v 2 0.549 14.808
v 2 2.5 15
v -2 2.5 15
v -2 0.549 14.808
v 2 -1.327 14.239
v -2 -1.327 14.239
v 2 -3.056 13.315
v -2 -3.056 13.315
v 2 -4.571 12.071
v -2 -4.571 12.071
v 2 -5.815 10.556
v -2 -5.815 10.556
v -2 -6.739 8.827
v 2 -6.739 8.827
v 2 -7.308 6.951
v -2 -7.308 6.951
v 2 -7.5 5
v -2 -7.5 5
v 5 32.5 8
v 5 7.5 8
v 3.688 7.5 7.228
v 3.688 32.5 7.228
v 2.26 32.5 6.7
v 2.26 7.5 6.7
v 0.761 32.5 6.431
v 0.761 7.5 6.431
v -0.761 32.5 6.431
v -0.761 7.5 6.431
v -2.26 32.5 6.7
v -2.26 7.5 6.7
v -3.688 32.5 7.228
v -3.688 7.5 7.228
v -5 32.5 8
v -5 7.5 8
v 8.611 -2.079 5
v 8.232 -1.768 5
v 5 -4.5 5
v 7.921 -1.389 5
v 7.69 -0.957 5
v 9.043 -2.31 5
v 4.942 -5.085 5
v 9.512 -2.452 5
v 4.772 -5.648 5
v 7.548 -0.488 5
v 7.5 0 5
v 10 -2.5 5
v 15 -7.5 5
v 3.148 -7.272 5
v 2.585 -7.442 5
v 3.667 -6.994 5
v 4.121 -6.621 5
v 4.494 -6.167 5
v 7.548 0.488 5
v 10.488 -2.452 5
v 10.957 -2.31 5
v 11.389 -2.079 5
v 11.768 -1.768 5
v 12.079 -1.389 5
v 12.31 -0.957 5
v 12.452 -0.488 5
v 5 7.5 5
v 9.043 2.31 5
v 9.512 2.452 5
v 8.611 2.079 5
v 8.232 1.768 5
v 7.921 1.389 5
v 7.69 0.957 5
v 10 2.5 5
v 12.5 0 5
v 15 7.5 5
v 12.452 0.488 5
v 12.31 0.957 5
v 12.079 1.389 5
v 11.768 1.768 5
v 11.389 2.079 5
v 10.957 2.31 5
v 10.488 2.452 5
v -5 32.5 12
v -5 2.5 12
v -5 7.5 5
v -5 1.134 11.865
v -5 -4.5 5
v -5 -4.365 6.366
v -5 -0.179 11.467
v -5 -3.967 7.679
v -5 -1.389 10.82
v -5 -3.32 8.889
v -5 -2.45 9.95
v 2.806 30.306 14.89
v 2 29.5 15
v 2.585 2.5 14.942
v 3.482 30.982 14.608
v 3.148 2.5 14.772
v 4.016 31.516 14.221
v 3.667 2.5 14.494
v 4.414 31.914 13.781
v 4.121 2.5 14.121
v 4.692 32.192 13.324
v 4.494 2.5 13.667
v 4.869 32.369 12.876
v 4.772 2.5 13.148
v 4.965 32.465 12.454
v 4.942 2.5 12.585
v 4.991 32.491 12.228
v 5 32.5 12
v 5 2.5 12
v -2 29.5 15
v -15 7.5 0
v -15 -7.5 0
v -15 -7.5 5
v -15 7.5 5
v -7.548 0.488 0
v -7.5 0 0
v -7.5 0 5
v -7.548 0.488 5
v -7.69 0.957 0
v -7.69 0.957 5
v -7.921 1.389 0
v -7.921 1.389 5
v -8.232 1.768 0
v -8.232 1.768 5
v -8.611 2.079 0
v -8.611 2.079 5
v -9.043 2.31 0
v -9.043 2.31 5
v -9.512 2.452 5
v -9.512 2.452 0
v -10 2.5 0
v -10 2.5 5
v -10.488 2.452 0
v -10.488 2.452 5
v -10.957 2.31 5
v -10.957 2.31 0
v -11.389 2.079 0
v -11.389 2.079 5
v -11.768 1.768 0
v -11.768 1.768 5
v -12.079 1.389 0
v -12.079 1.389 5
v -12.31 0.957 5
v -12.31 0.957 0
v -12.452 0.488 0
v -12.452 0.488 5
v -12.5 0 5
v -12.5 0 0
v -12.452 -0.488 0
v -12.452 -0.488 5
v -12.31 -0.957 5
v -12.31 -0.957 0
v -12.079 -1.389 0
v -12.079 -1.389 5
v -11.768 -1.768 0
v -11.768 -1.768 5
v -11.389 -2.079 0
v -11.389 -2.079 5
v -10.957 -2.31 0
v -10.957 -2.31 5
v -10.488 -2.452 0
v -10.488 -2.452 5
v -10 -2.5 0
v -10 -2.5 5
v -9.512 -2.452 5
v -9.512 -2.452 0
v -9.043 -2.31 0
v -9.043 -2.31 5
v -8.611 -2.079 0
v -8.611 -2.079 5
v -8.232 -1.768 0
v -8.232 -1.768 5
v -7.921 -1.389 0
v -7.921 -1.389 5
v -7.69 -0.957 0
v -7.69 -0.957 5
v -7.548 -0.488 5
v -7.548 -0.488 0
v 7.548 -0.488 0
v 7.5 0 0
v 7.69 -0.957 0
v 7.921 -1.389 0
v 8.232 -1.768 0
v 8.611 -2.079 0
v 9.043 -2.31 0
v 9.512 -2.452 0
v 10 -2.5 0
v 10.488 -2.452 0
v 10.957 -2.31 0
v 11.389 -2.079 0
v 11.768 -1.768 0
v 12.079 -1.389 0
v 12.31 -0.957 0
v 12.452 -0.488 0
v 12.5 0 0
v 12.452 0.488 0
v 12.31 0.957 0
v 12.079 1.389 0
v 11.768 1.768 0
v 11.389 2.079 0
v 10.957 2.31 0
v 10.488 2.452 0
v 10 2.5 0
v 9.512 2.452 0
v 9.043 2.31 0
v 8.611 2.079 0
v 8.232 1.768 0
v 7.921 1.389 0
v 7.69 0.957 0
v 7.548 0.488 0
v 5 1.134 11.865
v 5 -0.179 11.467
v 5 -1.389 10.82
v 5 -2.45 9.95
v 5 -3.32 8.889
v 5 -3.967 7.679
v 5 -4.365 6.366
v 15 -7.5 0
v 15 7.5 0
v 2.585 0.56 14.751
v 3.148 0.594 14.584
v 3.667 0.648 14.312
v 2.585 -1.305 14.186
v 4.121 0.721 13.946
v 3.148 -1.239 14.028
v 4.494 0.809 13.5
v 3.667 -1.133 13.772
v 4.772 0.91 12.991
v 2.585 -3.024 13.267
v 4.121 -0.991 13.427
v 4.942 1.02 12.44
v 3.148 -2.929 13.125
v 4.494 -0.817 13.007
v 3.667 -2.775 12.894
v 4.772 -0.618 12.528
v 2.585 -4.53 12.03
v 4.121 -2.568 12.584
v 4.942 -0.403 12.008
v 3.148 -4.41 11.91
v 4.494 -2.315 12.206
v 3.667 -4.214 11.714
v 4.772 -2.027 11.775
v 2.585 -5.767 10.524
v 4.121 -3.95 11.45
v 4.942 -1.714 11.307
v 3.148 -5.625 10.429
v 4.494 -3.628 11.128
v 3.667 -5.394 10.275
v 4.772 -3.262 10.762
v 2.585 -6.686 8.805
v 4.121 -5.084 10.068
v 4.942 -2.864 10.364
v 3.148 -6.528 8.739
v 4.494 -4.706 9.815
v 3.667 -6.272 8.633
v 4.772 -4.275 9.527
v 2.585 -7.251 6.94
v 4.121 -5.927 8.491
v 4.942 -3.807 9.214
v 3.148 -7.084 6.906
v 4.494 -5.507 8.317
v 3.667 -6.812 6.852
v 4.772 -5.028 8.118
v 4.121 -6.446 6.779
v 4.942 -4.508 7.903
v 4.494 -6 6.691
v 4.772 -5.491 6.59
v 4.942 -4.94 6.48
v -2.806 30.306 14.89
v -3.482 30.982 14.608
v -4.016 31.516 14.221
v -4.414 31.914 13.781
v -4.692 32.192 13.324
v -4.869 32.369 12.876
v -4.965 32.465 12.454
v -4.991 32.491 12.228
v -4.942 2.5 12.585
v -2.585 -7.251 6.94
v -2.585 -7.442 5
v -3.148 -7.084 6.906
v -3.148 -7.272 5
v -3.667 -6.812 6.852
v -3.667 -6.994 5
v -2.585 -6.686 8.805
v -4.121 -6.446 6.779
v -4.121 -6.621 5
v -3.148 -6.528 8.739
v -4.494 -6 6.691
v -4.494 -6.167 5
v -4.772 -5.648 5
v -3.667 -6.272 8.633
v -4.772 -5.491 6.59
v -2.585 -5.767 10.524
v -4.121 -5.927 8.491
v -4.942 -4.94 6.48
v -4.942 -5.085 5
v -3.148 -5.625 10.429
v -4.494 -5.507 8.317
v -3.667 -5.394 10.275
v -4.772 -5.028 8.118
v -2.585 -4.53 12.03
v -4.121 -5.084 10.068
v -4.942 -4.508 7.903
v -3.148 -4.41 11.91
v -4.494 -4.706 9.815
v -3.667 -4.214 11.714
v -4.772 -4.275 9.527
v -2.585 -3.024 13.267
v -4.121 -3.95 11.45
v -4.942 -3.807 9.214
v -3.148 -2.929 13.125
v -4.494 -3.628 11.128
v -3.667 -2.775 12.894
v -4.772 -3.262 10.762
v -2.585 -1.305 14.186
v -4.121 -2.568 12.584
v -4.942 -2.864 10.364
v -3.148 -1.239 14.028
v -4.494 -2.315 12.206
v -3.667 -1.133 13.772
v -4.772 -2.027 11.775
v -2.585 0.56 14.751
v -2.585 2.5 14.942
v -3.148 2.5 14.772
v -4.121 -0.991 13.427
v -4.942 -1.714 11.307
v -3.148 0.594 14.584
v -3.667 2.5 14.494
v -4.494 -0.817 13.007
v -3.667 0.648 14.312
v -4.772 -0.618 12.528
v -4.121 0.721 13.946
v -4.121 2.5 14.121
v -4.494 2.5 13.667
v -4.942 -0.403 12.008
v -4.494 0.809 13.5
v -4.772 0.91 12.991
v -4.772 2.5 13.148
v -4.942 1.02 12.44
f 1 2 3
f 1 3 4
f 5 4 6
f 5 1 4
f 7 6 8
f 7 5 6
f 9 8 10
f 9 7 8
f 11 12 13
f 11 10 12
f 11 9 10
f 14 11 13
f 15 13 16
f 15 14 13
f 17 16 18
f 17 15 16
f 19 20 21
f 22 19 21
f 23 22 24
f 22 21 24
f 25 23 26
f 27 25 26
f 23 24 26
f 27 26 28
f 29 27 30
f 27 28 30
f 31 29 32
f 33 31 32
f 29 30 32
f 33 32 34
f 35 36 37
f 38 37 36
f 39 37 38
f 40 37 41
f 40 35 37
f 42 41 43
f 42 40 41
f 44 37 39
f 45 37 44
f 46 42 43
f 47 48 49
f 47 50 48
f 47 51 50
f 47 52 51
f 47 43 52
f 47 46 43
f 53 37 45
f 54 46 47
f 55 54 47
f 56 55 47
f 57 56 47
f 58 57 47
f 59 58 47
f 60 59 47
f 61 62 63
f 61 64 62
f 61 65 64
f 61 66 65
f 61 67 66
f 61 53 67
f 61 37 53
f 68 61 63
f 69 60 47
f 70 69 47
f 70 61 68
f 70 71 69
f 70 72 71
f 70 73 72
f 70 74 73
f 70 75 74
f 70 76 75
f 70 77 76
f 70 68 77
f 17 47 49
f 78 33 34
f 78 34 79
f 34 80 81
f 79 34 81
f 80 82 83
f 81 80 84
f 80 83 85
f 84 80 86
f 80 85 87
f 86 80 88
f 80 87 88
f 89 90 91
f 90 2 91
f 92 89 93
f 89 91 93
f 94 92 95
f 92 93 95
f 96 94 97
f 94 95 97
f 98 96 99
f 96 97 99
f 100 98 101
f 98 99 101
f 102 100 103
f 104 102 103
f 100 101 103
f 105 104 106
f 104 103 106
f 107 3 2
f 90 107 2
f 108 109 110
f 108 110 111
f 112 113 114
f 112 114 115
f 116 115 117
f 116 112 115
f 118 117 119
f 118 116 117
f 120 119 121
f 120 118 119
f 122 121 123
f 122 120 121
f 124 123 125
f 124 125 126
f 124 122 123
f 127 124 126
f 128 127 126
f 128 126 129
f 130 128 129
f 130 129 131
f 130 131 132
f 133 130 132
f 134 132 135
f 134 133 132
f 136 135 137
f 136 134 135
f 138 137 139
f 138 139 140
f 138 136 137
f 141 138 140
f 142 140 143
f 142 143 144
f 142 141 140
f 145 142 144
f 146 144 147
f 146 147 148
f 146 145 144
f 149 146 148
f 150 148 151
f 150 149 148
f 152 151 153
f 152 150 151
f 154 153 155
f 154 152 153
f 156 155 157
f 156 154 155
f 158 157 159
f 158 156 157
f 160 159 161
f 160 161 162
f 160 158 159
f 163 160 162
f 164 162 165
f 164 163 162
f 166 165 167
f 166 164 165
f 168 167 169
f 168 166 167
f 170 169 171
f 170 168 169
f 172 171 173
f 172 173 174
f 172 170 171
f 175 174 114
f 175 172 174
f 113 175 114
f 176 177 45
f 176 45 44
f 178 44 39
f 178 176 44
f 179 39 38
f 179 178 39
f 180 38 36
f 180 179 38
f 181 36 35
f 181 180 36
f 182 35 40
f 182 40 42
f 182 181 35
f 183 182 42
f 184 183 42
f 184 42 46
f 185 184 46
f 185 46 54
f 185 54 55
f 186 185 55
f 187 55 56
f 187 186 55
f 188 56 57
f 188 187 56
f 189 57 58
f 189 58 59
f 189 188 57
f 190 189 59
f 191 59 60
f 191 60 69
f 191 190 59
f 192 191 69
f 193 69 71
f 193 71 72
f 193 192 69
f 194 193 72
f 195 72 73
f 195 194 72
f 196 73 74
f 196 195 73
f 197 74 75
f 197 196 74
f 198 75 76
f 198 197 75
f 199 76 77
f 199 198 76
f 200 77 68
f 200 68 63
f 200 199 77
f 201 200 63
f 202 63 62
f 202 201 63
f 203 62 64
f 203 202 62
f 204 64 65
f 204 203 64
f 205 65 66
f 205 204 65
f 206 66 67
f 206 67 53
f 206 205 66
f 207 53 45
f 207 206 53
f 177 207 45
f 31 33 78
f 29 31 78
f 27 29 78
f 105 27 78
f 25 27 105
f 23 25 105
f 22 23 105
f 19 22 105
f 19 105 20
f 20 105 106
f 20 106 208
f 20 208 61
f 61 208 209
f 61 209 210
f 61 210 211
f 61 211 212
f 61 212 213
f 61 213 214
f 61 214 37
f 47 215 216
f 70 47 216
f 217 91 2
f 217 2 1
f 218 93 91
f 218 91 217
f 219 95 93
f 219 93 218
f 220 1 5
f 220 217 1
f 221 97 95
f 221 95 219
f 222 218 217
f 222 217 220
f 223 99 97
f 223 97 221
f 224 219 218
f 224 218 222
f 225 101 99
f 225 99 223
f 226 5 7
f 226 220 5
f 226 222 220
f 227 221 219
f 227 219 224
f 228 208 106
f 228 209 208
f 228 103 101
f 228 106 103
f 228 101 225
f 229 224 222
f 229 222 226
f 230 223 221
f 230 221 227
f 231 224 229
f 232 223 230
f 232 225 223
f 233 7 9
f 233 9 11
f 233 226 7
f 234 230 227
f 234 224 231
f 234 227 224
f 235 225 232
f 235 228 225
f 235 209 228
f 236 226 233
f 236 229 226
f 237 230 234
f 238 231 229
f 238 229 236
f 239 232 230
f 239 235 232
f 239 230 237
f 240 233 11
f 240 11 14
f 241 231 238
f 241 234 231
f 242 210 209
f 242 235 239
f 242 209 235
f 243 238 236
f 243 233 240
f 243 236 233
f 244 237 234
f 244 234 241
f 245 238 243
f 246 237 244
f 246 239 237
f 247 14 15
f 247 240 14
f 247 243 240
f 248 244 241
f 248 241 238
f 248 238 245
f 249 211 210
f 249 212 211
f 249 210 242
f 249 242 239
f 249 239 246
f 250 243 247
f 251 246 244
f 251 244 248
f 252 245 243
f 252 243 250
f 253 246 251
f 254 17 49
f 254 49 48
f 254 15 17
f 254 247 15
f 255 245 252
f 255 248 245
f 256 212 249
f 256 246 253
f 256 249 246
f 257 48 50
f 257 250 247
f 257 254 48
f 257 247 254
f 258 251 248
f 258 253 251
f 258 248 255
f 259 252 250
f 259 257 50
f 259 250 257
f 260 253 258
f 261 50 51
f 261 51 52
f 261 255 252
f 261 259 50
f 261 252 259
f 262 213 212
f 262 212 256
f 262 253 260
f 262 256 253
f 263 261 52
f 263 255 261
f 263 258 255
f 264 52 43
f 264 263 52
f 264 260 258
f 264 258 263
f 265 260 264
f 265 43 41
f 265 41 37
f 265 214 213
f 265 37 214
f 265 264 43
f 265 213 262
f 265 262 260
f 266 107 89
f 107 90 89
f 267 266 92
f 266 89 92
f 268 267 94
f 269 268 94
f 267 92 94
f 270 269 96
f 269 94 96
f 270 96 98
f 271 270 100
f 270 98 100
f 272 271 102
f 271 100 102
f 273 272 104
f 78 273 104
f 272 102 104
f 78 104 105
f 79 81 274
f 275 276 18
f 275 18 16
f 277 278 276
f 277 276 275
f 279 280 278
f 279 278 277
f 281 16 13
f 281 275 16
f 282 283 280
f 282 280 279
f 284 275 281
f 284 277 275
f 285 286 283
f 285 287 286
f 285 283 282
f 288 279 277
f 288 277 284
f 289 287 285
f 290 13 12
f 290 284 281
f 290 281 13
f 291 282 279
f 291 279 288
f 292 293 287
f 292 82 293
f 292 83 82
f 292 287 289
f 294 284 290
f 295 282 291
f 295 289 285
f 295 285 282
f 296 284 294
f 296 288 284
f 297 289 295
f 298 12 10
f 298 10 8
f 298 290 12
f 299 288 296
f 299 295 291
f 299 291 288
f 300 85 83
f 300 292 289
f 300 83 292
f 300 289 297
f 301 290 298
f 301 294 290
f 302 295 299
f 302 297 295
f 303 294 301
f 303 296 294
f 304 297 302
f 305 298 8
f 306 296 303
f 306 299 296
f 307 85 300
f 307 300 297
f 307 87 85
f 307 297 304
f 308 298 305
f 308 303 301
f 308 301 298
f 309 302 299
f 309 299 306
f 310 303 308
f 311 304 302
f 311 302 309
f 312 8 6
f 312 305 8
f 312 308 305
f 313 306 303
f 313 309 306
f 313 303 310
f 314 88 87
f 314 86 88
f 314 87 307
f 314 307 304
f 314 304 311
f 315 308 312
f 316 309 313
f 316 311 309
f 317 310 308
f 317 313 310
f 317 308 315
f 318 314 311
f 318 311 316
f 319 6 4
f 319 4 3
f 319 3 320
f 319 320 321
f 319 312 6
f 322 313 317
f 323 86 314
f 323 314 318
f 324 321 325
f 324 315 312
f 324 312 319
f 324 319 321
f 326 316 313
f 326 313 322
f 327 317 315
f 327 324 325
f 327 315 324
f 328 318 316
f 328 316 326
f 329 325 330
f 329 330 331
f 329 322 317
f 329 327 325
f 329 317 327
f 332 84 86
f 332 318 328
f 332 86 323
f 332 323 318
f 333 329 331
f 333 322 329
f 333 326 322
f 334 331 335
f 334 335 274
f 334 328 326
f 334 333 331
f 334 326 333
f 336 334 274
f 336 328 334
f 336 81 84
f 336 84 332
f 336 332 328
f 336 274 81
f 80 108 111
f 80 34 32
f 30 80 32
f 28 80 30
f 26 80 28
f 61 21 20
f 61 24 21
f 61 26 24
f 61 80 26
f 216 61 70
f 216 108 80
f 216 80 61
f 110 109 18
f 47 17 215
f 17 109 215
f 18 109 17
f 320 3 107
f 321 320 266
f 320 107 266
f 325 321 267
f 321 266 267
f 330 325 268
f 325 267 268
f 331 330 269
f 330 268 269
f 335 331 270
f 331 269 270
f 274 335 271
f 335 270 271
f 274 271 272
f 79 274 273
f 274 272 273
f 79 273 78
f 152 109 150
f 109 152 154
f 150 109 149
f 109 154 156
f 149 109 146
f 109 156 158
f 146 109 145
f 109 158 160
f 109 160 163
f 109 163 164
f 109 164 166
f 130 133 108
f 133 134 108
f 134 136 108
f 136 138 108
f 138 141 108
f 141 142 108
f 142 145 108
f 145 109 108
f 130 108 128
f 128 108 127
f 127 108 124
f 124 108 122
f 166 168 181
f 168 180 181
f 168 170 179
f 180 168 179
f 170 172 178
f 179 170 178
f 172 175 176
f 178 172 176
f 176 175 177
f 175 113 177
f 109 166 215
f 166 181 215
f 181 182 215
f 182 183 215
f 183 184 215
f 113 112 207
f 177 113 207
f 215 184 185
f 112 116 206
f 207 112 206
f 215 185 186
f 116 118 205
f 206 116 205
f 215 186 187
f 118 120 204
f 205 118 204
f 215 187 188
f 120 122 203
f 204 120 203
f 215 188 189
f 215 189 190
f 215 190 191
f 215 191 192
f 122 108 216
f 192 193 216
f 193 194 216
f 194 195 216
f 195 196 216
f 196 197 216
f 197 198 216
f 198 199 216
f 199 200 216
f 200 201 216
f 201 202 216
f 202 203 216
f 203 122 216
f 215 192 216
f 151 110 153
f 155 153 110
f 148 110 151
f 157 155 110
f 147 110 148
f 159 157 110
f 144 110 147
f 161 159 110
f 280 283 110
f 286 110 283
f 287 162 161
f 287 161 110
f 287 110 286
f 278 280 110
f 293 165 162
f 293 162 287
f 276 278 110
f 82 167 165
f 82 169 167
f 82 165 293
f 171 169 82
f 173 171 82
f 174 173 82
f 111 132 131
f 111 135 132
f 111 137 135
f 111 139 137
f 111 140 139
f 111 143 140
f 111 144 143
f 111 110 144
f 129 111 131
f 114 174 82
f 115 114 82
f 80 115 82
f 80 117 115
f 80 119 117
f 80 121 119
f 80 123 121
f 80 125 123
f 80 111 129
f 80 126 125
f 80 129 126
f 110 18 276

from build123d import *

# Parameters (mm, degrees)
ESQUISSE1_W        = 30
ESQUISSE1_H        = 15
ESQUISSE1_R        = 2.5
BOSS_EXTRU_2_DEPTH = 5
ESQUISSE2_W        = 10
ESQUISSE2_H        = 15
BOSS_EXTRU_3_DEPTH = 10
BOSS_EXTRU_5_DEPTH = 25
CONG_1_R           = 10
CONG_2_R           = 3


with BuildPart() as part:
    # Esquisse1 → Boss.-Extru.2 (new body)
    with BuildSketch(Plane.XY):
        Rectangle(ESQUISSE1_W, ESQUISSE1_H)
        with Locations((-10, 0)):
            Circle(ESQUISSE1_R, mode=Mode.SUBTRACT)
        with Locations(Location((10, 0, 0), (0, 0, 180))):
            Circle(ESQUISSE1_R, mode=Mode.SUBTRACT)
    extrude(amount=BOSS_EXTRU_2_DEPTH)

    # Esquisse2 → Boss.-Extru.3 (add)
    with BuildSketch(Plane.XY.offset(5)):
        Rectangle(ESQUISSE2_W, ESQUISSE2_H)
    extrude(amount=BOSS_EXTRU_3_DEPTH)

    # Esquisse3 → Boss.-Extru.5 (add)
    with BuildSketch(Plane(origin=(0, 7.5, 0), x_dir=(1, 0, 0), z_dir=(0, 1, 0))):
        with BuildLine():
            ThreePointArc((5, -8), (0, -6.397674733), (-5, -8))
            Line((-5, -8), (-5, -15))
            Line((-5, -15), (5, -15))
            Line((5, -15), (5, -8))
        make_face()
    extrude(amount=BOSS_EXTRU_5_DEPTH)

    # Congé1
    cong_1_edges = [part.edges().sort_by_distance(p)[0] for p in [
        (0, -7.5, 15),
    ]]
    fillet(cong_1_edges, radius=CONG_1_R)

    # Congé2
    cong_2_edges = [part.edges().sort_by_distance(p)[0] for p in [
        (-5, 17.5, 15),
        (0, 32.5, 15),
        (5, 17.5, 15),
        (5, -4.571067812, 12.071067812),
        (-5, -4.571067812, 12.071067812),
    ]]
    fillet(cong_2_edges, radius=CONG_2_R)


solid = part.part
